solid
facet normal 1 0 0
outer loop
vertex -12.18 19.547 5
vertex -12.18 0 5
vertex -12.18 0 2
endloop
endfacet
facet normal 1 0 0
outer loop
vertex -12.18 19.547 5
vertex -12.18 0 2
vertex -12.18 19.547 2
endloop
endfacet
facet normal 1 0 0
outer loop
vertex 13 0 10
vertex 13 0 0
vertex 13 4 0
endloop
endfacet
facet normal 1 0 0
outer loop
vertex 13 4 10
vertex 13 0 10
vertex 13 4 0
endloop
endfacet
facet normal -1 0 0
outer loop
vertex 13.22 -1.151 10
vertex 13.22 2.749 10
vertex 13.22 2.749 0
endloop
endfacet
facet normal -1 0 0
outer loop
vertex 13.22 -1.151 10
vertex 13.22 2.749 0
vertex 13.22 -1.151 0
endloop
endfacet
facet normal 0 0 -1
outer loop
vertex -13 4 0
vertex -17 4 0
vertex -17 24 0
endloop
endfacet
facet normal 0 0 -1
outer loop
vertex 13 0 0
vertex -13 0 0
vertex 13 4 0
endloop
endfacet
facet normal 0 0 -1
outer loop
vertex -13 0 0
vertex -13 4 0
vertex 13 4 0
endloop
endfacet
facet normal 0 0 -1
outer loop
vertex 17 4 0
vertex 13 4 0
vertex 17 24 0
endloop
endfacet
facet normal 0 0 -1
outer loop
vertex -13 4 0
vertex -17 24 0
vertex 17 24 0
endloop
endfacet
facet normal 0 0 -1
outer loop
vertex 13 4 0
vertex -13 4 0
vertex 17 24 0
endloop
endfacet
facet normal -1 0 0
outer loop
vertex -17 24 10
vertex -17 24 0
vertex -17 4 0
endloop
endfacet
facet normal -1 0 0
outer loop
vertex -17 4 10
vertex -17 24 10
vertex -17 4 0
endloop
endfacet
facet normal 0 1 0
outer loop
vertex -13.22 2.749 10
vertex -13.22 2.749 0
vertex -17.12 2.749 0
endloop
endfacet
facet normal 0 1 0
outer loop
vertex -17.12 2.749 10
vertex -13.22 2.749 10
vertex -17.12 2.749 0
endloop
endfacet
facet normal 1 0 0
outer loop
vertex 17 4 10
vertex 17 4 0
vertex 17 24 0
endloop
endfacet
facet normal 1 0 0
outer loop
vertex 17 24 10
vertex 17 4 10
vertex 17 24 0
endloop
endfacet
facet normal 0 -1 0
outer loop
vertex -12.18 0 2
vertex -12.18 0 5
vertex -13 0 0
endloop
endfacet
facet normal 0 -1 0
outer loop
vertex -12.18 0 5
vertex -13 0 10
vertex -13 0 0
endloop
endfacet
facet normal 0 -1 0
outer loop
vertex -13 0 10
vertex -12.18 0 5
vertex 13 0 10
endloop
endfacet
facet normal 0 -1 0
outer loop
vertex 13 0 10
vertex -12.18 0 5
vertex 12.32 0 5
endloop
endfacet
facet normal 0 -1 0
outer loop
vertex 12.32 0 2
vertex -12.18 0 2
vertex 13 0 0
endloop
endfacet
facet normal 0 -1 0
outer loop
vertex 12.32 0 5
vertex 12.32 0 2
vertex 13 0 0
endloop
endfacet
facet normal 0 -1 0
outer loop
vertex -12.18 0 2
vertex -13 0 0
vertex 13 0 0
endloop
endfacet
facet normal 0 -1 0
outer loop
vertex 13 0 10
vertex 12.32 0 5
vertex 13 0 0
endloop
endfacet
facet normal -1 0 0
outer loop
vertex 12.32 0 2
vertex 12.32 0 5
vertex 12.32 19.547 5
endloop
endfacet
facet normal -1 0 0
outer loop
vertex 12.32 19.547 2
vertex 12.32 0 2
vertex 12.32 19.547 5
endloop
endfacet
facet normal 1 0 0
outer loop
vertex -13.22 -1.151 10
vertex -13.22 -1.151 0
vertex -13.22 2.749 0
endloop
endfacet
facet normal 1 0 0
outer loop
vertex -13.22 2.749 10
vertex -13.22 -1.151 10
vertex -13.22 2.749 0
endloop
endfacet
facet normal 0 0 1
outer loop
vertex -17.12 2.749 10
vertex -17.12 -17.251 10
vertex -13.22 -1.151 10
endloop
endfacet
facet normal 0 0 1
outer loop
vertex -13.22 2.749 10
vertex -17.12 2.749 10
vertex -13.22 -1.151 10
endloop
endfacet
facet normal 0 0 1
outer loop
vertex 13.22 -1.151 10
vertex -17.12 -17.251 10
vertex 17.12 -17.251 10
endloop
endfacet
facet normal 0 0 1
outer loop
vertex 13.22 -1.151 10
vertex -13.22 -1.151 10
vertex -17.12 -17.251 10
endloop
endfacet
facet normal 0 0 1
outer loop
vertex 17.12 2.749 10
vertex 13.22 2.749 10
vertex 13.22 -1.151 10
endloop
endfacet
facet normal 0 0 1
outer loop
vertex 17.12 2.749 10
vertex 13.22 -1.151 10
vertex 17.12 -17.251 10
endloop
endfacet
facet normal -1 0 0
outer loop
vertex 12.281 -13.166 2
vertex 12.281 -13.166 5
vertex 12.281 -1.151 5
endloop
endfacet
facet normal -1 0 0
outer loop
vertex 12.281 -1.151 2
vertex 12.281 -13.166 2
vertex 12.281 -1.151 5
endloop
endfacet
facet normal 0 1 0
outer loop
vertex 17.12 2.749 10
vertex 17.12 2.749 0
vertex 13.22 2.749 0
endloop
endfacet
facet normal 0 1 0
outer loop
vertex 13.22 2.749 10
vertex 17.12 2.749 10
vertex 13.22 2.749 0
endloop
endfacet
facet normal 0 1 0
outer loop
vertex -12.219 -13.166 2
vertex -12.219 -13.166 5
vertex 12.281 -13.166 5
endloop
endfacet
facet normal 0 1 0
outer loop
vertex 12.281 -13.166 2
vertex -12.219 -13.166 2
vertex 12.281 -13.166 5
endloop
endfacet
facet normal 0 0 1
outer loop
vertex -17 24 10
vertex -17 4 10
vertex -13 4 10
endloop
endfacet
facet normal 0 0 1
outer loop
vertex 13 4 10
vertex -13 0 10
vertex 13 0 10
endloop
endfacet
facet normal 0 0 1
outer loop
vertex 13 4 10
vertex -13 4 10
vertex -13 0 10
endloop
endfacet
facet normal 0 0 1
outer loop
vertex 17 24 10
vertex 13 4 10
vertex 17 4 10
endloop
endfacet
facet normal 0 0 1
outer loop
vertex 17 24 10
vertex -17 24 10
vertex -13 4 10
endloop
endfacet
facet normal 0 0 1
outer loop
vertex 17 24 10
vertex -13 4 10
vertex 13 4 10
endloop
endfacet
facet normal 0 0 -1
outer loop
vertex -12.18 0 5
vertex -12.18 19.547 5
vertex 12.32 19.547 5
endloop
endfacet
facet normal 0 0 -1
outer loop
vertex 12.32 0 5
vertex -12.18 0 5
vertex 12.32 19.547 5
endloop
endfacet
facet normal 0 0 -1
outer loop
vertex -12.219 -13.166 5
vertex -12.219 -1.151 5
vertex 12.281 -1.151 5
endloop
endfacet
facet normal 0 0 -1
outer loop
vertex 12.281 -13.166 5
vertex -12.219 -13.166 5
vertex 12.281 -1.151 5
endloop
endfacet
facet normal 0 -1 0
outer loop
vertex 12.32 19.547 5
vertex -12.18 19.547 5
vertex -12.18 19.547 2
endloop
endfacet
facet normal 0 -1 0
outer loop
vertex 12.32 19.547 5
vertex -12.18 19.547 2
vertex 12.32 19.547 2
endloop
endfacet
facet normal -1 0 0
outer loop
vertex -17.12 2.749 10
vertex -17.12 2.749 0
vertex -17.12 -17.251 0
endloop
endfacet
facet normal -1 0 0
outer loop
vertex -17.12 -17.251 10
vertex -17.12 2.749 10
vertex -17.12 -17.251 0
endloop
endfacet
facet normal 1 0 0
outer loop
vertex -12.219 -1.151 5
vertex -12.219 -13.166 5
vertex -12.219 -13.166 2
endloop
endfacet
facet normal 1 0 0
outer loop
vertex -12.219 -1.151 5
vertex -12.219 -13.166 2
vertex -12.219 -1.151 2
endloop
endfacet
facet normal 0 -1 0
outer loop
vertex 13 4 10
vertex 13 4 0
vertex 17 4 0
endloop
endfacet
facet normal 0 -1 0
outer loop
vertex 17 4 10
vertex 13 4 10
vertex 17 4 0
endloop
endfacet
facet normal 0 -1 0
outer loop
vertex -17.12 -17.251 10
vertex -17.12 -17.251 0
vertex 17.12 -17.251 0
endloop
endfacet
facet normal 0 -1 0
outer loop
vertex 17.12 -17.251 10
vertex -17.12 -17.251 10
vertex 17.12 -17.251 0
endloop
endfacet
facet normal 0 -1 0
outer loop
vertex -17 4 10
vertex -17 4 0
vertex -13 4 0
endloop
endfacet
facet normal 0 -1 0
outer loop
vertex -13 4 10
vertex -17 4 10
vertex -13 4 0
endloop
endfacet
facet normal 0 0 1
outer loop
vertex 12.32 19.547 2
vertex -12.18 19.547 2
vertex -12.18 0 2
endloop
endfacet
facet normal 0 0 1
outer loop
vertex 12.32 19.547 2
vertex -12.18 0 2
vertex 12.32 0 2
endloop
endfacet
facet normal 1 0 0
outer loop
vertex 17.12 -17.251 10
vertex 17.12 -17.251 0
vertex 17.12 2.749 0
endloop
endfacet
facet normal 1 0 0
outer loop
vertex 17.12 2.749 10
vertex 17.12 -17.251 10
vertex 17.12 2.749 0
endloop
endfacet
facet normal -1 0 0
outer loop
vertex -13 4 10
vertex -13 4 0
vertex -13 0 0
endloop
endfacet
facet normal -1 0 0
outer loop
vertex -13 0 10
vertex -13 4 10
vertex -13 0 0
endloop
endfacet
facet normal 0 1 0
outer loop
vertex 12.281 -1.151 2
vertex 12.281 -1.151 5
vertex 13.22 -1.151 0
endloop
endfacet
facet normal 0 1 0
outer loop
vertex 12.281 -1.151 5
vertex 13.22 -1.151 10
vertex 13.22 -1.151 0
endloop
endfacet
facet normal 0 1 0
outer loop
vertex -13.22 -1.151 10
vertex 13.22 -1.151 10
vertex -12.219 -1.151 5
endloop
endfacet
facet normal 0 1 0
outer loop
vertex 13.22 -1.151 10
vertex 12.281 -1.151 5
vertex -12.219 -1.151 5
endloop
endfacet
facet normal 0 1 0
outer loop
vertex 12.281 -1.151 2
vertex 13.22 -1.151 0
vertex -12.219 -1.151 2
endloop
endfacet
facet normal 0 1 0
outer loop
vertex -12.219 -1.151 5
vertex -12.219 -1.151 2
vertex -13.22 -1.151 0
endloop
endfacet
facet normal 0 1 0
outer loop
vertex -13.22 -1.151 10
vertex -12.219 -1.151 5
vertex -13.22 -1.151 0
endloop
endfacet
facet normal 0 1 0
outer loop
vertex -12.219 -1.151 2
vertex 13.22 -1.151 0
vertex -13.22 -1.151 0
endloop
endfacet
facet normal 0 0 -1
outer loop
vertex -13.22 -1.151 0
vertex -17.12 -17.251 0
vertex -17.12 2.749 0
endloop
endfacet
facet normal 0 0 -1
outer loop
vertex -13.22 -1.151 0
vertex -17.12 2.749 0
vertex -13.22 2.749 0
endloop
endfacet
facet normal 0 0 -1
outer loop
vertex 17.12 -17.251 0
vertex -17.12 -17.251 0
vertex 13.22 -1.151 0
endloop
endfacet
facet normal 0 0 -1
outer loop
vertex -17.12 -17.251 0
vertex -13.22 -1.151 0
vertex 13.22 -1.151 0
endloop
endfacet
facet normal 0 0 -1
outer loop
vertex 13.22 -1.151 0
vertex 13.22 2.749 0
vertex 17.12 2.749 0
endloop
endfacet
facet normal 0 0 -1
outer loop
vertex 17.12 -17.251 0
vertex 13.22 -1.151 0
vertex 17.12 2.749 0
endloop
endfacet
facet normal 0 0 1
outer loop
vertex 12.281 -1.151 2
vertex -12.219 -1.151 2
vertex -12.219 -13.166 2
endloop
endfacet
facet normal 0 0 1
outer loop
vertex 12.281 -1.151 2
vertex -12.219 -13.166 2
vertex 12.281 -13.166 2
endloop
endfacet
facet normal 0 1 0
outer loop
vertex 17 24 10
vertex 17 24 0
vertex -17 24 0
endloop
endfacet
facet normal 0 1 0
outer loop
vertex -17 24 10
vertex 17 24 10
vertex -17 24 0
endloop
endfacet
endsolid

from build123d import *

# Parameters (mm, degrees)
F1_DEPTH = 10
F3_W     = 24.5
F3_H     = 19.5466473553
F4_DEPTH = 3
F5_W     = 24.5
F5_H     = 12.2730633011
F6_DEPTH = 3


with BuildPart() as f1:
    # F0 (on Top) → F1 (new body)
    with BuildSketch(Plane.XY):
        Polygon((-13, 0), (13, 0), (13, 4), (17, 4), (17, 24), (-17, 24), (-17, 4), (-13, 4), align=None)
    extrude(amount=F1_DEPTH)

    # F3 (on offset) → F4 (cut)
    with BuildSketch(Plane.XY.offset(5)):
        with Locations((0.0700059757, 9.7733236776)):
            Rectangle(F3_W, F3_H)
    extrude(amount=-F4_DEPTH, mode=Mode.SUBTRACT)


with BuildPart() as f1b:
    # F0 (on Top) → F1, piece 2 (new body)
    with BuildSketch(Plane.XY):
        Polygon((17.1204014808, 2.7489810166), (13.2204014808, 2.7489810166), (13.2204014808, -1.1510189834), (0, -1.1510189834), (-13.2204014808, -1.1510189834), (-13.2204014808, 2.7489810166), (-17.1204014808, 2.7489810166), (-17.1204014808, -17.2510189834), (17.1204014808, -17.2510189834), align=None)
    extrude(amount=F1_DEPTH)

    # F5 (on offset) → F6 (cut)
    with BuildSketch(Plane.XY.offset(5)):
        with Locations((0.0307181329, -7.0292878081)):
            Rectangle(F5_W, F5_H)
    extrude(amount=-F6_DEPTH, mode=Mode.SUBTRACT)


solid = Compound([f1.part, f1b.part])
